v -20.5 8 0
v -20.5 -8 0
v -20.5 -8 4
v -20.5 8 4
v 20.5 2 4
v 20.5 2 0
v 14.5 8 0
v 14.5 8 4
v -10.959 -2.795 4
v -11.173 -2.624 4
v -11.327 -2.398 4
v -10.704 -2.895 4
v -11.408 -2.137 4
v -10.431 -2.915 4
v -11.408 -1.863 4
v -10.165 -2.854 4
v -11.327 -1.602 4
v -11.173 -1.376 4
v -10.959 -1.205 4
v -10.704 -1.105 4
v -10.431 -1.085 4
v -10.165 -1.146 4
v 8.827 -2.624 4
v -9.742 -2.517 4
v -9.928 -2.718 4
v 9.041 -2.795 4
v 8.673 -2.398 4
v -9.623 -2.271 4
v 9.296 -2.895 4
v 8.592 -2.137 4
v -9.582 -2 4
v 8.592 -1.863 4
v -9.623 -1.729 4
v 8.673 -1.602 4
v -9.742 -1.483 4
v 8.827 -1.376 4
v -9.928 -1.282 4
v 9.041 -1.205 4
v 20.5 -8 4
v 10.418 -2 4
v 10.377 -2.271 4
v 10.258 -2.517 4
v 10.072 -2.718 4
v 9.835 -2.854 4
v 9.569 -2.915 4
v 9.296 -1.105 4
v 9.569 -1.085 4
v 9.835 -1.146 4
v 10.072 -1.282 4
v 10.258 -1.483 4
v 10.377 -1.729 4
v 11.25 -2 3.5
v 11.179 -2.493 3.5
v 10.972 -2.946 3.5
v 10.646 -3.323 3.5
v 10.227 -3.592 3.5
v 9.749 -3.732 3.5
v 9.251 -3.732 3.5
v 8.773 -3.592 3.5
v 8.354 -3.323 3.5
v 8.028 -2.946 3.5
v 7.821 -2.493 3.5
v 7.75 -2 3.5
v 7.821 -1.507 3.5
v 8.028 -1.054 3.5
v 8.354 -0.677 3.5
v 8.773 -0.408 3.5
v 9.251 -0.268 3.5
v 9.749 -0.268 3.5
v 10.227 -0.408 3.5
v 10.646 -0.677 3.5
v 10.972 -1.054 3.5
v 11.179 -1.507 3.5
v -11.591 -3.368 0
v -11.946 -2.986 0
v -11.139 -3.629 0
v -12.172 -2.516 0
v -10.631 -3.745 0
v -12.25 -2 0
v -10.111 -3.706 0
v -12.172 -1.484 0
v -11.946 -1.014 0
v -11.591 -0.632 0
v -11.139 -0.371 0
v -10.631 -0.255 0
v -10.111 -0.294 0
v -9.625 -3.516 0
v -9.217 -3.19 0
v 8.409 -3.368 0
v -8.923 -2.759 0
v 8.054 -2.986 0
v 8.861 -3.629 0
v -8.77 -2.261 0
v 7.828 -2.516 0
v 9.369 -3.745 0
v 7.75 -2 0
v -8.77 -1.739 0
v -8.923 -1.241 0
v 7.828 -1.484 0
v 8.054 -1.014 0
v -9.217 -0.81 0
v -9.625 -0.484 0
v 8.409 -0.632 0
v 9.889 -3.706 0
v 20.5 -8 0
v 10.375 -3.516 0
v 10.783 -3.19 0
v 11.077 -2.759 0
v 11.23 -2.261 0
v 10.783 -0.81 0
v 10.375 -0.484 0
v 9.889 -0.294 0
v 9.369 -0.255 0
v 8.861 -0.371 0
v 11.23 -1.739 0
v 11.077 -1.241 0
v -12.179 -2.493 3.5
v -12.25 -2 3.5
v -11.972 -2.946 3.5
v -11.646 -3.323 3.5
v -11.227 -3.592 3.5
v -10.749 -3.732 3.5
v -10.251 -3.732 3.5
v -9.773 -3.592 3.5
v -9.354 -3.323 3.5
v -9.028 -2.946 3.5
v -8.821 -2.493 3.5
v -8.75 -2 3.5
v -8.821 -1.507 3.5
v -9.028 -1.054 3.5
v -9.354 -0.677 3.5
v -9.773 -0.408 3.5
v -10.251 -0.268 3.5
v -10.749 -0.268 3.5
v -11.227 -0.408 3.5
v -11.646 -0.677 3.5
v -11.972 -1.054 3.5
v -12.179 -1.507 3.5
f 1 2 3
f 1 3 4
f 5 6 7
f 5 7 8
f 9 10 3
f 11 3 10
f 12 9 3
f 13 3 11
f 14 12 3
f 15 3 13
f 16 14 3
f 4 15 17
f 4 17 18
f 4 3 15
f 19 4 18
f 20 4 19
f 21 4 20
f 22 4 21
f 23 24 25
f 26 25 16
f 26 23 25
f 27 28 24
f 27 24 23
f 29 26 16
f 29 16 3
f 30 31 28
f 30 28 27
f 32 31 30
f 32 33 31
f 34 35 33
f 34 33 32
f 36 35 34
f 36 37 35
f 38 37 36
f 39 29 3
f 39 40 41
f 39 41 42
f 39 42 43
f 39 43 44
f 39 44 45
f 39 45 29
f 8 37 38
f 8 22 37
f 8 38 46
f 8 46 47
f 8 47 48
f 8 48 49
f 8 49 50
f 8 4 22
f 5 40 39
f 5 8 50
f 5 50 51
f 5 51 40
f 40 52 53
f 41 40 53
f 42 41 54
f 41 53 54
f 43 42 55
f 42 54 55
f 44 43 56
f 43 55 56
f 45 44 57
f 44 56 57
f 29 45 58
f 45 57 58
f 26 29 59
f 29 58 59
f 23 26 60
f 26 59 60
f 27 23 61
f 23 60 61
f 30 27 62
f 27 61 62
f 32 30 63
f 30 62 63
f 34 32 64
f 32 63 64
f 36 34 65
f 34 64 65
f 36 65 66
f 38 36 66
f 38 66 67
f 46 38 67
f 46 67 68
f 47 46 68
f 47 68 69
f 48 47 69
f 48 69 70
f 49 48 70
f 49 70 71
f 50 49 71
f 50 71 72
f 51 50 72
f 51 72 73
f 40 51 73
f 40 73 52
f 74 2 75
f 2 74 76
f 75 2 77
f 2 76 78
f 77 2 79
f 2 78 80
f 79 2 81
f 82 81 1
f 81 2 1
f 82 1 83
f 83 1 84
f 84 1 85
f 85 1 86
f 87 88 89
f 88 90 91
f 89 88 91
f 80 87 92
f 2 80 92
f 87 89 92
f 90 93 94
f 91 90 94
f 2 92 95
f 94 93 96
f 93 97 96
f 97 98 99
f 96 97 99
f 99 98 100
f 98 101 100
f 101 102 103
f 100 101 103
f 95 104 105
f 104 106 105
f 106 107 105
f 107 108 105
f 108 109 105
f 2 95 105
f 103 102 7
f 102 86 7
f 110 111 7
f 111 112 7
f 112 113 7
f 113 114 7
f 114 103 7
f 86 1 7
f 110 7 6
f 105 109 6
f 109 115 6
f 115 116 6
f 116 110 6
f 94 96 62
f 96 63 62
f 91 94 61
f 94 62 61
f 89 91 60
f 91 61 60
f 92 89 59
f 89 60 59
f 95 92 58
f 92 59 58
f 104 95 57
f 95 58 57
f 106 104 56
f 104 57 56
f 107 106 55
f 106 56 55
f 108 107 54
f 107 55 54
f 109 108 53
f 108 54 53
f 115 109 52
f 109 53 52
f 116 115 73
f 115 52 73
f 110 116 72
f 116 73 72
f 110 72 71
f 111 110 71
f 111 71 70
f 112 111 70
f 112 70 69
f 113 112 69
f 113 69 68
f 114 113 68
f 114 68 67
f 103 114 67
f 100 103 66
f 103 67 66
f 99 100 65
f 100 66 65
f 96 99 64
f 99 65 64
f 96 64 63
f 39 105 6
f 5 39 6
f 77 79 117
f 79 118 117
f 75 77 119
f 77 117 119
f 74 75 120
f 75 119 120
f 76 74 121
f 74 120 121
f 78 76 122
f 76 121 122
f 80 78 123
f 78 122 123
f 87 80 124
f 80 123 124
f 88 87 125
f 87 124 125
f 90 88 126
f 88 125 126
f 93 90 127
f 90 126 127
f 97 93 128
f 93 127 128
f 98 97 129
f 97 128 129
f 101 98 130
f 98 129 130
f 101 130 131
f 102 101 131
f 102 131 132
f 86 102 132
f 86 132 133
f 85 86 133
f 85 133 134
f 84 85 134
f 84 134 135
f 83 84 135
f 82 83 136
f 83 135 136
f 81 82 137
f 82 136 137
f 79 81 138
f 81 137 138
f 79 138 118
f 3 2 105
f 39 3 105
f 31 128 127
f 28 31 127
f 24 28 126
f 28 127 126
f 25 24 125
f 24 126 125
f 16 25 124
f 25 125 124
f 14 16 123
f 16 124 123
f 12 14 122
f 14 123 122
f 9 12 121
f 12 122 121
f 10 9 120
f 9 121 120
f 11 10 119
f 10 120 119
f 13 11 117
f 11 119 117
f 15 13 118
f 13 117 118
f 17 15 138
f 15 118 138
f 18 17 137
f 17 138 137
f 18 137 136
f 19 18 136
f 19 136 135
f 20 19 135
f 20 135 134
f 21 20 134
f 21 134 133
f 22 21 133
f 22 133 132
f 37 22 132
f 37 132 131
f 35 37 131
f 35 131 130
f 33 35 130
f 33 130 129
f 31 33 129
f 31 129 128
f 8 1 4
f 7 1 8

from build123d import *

# Parameters (mm, degrees)
F0_W     = 41
F0_H     = 16
F1_DEPTH = 4
F2_D     = 3.5
F2_DEPTH = 3.5
F2_TIP   = 1.0515060833
F3_SIZE  = 6


with BuildPart() as f1:
    # F0 (on Top) → F1 (new body)
    with BuildSketch(Plane.XY):
        Rectangle(F0_W, F0_H)
    extrude(amount=F1_DEPTH)

    # F2
    with Locations(Plane(origin=(0, 0, 0), x_dir=(1, 0, 0), z_dir=(0, 0, -1))):
        with Locations((-10.5, 2), (9.5, 2)):
            Hole(F2_D / 2, depth=F2_DEPTH)
            with Locations((0, 0, -(F2_DEPTH + F2_TIP / 2))):  # 118° drill point
                Cone(0, F2_D / 2, F2_TIP, mode=Mode.SUBTRACT)

    # F3
    f3_edges = [f1.edges().sort_by_distance(p)[0] for p in [
        (20.5, 8, 2),
    ]]
    chamfer(f3_edges, length=F3_SIZE)


solid = f1.part
